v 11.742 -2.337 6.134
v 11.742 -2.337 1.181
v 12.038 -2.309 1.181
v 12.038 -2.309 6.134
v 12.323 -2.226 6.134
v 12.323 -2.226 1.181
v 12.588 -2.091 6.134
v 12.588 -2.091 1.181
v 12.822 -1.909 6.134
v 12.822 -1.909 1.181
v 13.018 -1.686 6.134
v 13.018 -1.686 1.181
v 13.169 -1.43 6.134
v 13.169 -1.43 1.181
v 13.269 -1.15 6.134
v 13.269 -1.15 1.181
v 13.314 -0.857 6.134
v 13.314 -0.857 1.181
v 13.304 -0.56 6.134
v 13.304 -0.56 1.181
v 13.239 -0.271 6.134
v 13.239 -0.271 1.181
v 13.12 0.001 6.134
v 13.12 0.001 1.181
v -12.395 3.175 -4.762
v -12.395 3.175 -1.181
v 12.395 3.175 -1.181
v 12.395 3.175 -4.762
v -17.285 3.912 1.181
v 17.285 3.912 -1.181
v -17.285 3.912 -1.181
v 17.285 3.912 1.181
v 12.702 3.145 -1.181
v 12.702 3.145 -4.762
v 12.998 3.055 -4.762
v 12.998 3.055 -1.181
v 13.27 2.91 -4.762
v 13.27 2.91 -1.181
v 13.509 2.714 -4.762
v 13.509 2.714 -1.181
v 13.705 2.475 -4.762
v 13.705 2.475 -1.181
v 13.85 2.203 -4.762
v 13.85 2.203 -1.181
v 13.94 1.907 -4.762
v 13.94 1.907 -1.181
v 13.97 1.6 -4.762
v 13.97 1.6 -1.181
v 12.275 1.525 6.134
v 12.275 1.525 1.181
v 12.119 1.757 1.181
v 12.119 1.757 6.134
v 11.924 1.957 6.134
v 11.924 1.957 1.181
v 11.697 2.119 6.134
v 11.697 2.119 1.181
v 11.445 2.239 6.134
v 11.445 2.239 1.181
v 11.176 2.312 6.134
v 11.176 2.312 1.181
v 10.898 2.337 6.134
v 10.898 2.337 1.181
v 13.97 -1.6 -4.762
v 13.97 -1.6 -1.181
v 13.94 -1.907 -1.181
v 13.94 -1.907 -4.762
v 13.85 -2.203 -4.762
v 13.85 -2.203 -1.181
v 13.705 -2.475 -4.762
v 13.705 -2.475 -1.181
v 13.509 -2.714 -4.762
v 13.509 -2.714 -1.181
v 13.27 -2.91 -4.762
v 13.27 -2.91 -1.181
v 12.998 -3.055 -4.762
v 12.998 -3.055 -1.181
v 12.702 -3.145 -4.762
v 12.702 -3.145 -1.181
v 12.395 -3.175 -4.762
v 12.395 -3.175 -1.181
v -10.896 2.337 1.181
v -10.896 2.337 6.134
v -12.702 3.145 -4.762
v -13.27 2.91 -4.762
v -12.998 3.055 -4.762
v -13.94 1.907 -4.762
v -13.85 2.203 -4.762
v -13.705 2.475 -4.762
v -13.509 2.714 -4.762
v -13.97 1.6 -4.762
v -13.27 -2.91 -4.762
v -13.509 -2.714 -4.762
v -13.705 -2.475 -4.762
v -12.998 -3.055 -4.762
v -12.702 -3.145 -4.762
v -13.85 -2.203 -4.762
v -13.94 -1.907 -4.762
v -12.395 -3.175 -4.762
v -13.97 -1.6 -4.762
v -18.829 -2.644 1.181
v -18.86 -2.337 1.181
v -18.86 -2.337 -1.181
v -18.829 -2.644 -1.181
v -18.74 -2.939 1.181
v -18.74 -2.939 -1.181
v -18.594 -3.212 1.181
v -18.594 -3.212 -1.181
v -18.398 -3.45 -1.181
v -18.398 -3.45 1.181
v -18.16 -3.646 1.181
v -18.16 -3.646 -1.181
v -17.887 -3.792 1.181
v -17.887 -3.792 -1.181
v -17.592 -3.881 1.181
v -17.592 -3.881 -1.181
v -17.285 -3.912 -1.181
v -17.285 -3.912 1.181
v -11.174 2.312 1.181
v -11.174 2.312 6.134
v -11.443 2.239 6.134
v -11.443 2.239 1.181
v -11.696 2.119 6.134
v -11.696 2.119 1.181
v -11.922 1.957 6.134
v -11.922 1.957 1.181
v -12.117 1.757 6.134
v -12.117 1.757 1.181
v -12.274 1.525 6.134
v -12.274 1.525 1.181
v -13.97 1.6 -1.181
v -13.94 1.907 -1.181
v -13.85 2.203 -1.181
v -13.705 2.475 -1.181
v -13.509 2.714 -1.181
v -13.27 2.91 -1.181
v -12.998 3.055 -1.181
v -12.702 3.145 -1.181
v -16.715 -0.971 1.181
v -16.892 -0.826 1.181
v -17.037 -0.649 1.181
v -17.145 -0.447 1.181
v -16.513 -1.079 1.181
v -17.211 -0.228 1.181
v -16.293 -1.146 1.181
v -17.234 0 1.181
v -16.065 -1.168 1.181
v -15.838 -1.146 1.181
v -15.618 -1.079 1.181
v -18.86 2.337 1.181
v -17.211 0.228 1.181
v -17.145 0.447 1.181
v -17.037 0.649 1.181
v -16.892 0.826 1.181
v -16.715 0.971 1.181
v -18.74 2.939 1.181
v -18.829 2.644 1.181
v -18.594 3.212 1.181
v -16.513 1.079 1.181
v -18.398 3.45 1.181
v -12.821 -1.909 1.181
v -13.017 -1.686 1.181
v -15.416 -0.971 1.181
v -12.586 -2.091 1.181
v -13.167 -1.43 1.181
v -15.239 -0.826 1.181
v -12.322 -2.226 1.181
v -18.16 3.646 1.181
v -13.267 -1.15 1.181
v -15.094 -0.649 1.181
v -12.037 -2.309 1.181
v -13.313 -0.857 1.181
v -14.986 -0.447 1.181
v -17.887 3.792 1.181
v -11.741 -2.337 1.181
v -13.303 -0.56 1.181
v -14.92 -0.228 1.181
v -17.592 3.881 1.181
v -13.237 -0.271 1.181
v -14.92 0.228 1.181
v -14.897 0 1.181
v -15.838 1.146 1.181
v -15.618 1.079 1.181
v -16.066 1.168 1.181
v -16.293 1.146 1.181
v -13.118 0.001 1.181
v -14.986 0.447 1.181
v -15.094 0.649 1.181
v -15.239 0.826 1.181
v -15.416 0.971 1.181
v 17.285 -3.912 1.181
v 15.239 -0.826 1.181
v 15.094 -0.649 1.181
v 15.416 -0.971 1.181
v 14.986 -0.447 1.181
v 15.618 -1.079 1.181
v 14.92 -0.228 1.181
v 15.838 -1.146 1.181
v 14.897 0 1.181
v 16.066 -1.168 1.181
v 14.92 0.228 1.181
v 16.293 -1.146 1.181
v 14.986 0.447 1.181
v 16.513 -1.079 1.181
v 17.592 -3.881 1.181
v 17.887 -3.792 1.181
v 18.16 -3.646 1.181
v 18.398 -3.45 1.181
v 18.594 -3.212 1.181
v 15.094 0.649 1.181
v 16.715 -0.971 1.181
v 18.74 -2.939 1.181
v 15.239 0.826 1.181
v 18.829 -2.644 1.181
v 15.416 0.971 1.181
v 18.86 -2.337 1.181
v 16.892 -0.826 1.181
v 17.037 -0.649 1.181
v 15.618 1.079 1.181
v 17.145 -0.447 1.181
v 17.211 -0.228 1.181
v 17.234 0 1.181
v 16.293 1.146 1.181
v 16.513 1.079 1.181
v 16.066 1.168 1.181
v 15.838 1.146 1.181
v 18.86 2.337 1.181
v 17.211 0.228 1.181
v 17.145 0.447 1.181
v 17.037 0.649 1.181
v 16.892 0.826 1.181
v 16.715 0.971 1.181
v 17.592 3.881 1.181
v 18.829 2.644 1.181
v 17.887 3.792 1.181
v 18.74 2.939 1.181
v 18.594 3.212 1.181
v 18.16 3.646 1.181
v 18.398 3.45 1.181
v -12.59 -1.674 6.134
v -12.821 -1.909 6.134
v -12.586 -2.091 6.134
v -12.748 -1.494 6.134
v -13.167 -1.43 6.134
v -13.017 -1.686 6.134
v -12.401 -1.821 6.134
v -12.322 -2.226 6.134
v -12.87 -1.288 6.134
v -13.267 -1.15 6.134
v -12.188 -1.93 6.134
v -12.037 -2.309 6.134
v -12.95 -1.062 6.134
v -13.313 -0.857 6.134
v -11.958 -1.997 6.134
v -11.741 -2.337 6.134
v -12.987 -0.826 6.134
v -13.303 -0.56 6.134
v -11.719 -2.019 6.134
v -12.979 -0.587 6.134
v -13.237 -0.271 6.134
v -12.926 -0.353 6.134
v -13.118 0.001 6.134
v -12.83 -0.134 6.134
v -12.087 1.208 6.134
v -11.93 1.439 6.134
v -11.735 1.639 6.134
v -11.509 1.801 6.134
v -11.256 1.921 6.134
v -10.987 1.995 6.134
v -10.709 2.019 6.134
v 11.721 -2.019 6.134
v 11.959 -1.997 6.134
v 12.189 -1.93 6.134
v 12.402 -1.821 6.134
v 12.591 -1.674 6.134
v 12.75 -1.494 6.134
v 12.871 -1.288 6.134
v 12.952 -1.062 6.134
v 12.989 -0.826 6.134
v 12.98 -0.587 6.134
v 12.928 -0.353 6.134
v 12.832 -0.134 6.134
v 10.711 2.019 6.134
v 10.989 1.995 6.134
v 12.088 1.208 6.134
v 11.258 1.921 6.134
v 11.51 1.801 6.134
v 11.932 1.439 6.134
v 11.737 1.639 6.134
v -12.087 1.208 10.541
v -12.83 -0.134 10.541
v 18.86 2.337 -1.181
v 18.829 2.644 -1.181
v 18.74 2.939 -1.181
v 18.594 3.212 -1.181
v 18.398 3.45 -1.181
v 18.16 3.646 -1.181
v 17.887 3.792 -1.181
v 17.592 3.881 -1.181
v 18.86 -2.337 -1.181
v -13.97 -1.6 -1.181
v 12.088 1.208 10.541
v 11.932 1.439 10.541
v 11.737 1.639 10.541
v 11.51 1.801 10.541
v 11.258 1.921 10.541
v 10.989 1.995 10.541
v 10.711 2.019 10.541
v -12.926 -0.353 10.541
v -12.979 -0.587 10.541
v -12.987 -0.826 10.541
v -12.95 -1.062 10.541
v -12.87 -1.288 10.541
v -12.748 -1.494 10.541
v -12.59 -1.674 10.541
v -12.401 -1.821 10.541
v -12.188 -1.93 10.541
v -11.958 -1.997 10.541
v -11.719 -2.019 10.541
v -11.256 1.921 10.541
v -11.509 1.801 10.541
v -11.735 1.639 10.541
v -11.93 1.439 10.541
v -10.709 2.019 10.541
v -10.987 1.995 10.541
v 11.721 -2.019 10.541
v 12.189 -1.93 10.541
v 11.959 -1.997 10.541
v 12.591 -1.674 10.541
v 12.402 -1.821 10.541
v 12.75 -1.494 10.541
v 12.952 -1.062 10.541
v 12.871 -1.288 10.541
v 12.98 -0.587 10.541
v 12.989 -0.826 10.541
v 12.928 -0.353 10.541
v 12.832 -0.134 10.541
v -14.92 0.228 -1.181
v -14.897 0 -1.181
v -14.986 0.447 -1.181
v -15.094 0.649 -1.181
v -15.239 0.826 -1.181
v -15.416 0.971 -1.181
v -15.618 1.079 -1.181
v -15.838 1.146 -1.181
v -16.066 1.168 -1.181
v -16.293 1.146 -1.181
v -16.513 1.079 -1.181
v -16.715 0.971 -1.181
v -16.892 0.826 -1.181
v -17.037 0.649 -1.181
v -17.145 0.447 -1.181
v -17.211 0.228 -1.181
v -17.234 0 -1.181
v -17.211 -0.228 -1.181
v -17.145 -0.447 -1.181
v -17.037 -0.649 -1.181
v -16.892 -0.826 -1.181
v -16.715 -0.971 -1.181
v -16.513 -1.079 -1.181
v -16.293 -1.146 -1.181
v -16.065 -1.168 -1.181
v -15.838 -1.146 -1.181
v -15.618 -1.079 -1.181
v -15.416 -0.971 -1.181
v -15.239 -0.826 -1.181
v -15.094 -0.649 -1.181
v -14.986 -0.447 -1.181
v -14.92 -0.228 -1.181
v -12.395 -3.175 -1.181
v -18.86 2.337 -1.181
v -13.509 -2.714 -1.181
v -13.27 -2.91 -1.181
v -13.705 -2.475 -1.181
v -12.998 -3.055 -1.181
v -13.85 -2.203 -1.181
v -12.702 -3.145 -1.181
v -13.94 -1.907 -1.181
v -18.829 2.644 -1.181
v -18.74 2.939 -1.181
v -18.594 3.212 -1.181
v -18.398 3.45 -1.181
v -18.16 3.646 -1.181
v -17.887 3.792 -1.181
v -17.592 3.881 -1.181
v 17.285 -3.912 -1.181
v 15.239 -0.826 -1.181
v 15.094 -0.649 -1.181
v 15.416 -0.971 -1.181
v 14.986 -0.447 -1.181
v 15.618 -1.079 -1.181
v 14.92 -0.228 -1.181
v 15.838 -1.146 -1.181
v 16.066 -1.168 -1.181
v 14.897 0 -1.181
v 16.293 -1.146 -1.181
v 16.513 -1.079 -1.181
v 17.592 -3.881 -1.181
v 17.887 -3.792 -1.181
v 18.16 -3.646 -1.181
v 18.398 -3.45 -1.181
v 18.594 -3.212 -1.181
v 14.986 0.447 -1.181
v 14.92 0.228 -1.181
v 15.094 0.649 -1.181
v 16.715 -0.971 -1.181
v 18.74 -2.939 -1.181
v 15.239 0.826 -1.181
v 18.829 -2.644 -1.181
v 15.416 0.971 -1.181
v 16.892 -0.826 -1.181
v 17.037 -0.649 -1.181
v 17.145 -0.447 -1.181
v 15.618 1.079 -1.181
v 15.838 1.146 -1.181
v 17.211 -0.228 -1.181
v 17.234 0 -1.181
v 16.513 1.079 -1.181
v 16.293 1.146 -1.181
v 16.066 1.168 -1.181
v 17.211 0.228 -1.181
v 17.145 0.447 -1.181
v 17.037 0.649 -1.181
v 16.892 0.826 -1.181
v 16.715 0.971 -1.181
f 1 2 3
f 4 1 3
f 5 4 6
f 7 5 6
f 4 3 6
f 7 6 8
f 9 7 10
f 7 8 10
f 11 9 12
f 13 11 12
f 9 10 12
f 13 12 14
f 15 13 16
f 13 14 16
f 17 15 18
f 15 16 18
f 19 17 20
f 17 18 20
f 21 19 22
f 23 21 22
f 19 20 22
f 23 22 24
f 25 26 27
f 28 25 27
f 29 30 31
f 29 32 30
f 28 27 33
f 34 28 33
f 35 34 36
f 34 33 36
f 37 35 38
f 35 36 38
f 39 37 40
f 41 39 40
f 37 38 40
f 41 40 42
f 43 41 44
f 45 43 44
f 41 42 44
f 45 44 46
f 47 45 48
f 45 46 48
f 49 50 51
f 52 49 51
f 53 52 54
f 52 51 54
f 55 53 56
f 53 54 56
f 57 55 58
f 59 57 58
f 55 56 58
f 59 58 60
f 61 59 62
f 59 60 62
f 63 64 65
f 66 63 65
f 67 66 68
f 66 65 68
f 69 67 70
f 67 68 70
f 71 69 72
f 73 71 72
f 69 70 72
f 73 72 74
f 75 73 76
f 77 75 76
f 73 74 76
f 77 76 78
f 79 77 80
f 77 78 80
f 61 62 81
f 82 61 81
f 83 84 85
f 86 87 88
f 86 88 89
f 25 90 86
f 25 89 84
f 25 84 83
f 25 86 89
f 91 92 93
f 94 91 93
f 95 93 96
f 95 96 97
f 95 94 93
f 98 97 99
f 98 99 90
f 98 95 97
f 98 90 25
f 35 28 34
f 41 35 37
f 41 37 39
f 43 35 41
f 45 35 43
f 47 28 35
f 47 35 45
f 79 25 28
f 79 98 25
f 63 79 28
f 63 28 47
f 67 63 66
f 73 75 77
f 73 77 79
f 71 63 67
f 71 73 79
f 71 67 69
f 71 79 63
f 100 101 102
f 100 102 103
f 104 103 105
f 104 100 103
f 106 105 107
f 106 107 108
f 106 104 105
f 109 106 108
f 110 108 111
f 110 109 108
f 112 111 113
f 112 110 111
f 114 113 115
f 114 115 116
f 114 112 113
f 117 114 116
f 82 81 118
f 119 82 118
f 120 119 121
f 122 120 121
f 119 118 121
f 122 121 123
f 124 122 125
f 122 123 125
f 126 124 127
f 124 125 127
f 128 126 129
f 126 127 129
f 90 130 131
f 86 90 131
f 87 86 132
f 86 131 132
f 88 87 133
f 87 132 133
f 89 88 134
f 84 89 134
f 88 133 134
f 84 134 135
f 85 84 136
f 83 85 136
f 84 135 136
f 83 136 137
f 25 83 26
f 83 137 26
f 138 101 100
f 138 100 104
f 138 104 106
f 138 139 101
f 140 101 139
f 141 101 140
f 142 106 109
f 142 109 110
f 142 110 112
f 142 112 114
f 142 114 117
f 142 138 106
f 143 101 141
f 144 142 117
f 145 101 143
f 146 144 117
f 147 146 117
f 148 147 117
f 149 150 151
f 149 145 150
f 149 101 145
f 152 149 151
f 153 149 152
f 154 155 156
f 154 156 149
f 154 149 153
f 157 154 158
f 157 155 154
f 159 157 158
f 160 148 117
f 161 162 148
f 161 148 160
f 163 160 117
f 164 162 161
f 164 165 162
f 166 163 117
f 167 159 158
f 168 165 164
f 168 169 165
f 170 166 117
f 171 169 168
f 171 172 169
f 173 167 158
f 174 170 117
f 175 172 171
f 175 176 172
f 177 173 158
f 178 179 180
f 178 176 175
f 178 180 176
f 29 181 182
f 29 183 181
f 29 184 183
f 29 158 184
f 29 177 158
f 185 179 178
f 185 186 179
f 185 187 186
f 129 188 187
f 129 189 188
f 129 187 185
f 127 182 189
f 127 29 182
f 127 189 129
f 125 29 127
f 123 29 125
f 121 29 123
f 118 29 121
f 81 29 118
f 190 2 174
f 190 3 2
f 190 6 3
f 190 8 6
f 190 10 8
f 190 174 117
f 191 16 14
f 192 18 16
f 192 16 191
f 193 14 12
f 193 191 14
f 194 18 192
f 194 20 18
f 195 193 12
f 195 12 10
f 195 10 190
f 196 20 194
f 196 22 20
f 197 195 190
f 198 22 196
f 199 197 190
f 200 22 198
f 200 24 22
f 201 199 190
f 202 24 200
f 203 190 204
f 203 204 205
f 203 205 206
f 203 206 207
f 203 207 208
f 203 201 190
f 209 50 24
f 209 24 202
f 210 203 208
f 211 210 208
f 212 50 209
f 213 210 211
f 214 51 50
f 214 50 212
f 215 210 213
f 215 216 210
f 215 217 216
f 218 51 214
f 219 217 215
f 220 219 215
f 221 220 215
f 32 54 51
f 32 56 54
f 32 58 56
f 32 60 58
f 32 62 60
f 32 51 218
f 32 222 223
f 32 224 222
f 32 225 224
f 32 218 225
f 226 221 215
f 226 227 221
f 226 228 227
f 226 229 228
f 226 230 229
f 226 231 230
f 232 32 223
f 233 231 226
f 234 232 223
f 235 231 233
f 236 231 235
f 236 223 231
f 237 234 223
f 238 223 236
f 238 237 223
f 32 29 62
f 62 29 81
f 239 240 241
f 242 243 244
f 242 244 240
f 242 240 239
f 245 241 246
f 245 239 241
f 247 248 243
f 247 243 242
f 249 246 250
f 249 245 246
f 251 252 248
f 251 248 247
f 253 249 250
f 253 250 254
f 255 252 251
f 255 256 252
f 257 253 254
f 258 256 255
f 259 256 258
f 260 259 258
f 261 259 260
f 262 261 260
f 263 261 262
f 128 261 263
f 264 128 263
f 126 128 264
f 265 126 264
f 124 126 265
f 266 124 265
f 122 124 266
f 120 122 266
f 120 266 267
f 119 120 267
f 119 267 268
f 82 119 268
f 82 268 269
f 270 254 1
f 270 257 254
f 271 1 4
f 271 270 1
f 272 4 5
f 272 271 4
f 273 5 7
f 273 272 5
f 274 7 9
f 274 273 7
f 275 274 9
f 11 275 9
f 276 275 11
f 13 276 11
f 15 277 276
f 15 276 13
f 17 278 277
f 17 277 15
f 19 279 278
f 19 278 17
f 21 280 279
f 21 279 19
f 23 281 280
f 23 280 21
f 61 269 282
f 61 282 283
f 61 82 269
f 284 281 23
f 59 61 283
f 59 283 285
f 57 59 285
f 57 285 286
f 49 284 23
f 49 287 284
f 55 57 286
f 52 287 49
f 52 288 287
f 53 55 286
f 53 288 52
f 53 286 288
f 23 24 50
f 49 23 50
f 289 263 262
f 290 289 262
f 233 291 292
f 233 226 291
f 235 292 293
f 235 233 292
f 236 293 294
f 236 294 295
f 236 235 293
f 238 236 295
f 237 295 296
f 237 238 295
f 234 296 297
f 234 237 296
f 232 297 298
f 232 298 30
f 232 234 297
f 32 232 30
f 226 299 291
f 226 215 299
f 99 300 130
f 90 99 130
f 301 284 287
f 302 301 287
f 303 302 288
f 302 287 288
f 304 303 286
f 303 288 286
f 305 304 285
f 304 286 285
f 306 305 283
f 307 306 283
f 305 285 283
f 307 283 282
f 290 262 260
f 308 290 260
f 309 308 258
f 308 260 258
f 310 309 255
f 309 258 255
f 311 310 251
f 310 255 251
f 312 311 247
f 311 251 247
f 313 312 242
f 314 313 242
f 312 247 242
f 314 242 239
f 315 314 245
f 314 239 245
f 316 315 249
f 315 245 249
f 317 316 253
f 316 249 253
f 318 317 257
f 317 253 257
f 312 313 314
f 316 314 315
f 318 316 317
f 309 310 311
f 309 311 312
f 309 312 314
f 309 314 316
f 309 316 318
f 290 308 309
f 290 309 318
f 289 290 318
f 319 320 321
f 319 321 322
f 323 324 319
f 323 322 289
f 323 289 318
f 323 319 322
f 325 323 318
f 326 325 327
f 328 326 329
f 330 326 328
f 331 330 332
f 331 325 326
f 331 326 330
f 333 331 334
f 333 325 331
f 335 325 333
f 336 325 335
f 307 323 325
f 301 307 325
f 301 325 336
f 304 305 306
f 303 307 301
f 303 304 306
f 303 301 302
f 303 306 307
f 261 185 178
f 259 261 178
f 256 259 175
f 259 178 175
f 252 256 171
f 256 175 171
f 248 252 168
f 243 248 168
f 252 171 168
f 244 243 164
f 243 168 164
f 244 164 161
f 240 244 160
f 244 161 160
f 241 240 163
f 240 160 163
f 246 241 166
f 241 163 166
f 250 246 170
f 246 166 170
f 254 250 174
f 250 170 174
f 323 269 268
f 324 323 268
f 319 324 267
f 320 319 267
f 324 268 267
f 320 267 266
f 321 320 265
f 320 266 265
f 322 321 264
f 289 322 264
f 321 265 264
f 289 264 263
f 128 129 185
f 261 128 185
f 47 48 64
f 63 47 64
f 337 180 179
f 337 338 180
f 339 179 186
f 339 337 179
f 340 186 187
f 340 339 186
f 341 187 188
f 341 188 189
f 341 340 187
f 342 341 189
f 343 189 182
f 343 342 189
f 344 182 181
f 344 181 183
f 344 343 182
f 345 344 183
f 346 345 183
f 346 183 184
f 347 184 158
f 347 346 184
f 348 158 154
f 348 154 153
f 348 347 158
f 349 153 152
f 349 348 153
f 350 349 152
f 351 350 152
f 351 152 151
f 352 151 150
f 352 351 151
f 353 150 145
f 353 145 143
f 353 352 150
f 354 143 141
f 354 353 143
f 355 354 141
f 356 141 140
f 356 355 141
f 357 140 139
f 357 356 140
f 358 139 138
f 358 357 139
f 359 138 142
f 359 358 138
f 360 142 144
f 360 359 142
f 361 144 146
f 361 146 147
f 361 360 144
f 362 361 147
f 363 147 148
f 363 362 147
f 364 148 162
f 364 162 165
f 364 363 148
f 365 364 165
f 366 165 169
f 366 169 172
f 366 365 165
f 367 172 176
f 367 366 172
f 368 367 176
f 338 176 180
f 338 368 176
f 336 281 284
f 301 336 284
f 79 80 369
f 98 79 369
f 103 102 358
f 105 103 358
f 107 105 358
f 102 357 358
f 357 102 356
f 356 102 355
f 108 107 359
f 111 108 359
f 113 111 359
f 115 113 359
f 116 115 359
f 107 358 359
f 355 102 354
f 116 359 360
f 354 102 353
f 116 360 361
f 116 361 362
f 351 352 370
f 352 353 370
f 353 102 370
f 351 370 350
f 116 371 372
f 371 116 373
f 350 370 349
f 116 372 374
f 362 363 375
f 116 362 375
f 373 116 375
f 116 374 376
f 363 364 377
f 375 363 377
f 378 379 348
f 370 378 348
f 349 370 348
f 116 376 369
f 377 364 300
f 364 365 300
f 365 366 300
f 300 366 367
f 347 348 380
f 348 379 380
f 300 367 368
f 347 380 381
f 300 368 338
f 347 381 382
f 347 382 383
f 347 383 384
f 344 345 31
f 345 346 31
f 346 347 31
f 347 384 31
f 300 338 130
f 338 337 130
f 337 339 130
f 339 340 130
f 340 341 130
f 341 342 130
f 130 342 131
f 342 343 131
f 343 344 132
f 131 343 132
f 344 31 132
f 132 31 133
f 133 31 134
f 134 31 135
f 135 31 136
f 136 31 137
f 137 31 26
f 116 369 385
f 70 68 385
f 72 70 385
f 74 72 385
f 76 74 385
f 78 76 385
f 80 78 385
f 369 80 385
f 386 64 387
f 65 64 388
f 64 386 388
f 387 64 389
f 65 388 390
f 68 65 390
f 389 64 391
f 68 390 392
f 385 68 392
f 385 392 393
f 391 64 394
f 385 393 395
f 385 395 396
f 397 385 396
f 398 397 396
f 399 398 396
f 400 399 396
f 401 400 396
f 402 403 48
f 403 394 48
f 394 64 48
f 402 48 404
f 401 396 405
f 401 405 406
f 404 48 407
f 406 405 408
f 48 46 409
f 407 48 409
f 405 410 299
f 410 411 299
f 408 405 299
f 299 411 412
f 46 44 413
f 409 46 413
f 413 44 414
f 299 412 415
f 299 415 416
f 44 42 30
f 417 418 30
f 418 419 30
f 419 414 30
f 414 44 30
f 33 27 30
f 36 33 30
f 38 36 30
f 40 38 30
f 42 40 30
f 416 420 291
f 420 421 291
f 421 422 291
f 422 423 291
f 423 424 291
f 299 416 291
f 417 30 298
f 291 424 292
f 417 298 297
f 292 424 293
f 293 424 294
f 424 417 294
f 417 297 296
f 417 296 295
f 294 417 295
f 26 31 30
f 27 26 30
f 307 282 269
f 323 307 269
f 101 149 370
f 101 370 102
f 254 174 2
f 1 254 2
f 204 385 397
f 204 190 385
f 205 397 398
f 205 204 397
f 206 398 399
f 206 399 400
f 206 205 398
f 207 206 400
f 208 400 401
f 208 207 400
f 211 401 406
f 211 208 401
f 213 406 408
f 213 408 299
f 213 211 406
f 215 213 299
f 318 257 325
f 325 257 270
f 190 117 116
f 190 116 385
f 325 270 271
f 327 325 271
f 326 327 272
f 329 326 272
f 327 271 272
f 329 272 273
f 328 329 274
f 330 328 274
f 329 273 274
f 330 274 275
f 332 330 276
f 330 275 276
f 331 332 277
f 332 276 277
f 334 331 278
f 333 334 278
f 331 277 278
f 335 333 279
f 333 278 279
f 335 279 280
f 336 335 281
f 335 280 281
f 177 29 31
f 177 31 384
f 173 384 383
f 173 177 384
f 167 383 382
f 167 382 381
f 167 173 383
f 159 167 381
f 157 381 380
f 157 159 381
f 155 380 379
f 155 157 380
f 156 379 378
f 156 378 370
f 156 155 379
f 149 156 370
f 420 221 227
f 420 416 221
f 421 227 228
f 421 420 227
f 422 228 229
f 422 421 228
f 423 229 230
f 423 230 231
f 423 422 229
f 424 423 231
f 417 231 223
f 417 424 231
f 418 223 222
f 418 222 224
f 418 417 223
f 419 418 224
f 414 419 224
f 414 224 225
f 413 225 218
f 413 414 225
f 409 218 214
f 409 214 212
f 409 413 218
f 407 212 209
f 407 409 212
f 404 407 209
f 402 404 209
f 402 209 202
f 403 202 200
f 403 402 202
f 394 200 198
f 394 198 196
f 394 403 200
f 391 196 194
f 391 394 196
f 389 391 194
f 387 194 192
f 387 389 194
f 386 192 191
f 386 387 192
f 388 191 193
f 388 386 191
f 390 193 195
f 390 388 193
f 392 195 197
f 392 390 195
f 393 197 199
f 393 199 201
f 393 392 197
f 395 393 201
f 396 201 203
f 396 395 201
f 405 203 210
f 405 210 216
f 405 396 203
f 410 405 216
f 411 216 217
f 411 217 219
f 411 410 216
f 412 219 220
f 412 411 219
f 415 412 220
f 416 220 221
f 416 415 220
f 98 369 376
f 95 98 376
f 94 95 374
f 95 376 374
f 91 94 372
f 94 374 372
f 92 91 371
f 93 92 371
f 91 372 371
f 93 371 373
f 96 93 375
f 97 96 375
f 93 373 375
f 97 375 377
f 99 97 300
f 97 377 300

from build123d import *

# Parameters (mm, degrees)
F0_R     = 1.1684
F1_DEPTH = 1.1811
F3_DEPTH = 4.953
F5_DEPTH = 3.5814
F7_DEPTH = 4.4069


with BuildPart() as f1:
    # F0 (on Top) → F1 (new body, symmetric)
    with BuildSketch(Plane.XY):
        with BuildLine():
            Line((17.2847, 3.9116), (-17.2847, 3.9116))
            ThreePointArc((-17.2847, 3.9116), (-18.398252, 3.450352), (-18.8595, 2.3368))
            Line((-18.8595, 2.3368), (-18.8595, -2.3368))
            ThreePointArc((-18.8595, -2.3368), (-18.398252, -3.450352), (-17.2847, -3.9116))
            Line((-17.2847, -3.9116), (17.2847, -3.9116))
            ThreePointArc((17.2847, -3.9116), (18.398252, -3.450352), (18.8595, -2.3368))
            Line((18.8595, -2.3368), (18.8595, 2.3368))
            ThreePointArc((18.8595, 2.3368), (18.398252, 3.450352), (17.2847, 3.9116))
        make_face()
        with Locations((-16.0655, 0)):
            Circle(F0_R, mode=Mode.SUBTRACT)
        with Locations((16.0655, 0)):
            Circle(F0_R, mode=Mode.SUBTRACT)
    extrude(amount=F1_DEPTH, both=True)

    # F2 (on face) → F3 (join)
    with BuildSketch(Plane.XY.offset(1.1811)):
        with BuildLine():
            Line((-11.74102, -2.3368), (11.742478, -2.3368))
            ThreePointArc((11.742478, -2.3368), (13.099371, -1.561271), (13.119829, 0.001478))
            Line((13.119829, 0.001478), (12.275062, 1.525478))
            ThreePointArc((12.275062, 1.525478), (11.696982, 2.118894), (10.897711, 2.3368))
            Line((10.897711, 2.3368), (-10.896253, 2.3368))
            ThreePointArc((-10.896253, 2.3368), (-11.695525, 2.118894), (-12.273604, 1.525478))
            Line((-12.273604, 1.525478), (-13.118371, 0.001478))
            ThreePointArc((-13.118371, 0.001478), (-13.097914, -1.561271), (-11.74102, -2.3368))
        make_face()
    extrude(amount=F3_DEPTH)

    # F4 (on face) → F5 (join)
    with BuildSketch(Plane(origin=(0, 0, -1.1811), x_dir=(1, 0, 0), z_dir=(0, 0, -1))):
        with BuildLine():
            Line((12.3952, 3.175), (-12.3952, 3.175))
            ThreePointArc((-12.3952, 3.175), (-13.508752, 2.713752), (-13.97, 1.6002))
            Line((-13.97, 1.6002), (-13.97, -1.6002))
            ThreePointArc((-13.97, -1.6002), (-13.508752, -2.713752), (-12.3952, -3.175))
            Line((-12.3952, -3.175), (12.3952, -3.175))
            ThreePointArc((12.3952, -3.175), (13.508752, -2.713752), (13.97, -1.6002))
            Line((13.97, -1.6002), (13.97, 1.6002))
            ThreePointArc((13.97, 1.6002), (13.508752, 2.713752), (12.3952, 3.175))
        make_face()
    extrude(amount=F5_DEPTH)

    # F6 (on face) → F7 (join)
    with BuildSketch(Plane.XY.offset(6.1341)):
        with BuildLine():
            Line((10.710689, 2.0193), (-10.709231, 2.0193))
            ThreePointArc((-10.709231, 2.0193), (-11.508503, 1.801394), (-12.086582, 1.207978))
            Line((-12.086582, 1.207978), (-12.830227, -0.133592))
            ThreePointArc((-12.830227, -0.133592), (-12.813729, -1.393874), (-11.71946, -2.0193))
            Line((-11.71946, -2.0193), (11.720917, -2.0193))
            ThreePointArc((11.720917, -2.0193), (12.815186, -1.393874), (12.831684, -0.133592))
            Line((12.831684, -0.133592), (12.08804, 1.207978))
            ThreePointArc((12.08804, 1.207978), (11.50996, 1.801394), (10.710689, 2.0193))
        make_face()
    extrude(amount=F7_DEPTH)


solid = f1.part
